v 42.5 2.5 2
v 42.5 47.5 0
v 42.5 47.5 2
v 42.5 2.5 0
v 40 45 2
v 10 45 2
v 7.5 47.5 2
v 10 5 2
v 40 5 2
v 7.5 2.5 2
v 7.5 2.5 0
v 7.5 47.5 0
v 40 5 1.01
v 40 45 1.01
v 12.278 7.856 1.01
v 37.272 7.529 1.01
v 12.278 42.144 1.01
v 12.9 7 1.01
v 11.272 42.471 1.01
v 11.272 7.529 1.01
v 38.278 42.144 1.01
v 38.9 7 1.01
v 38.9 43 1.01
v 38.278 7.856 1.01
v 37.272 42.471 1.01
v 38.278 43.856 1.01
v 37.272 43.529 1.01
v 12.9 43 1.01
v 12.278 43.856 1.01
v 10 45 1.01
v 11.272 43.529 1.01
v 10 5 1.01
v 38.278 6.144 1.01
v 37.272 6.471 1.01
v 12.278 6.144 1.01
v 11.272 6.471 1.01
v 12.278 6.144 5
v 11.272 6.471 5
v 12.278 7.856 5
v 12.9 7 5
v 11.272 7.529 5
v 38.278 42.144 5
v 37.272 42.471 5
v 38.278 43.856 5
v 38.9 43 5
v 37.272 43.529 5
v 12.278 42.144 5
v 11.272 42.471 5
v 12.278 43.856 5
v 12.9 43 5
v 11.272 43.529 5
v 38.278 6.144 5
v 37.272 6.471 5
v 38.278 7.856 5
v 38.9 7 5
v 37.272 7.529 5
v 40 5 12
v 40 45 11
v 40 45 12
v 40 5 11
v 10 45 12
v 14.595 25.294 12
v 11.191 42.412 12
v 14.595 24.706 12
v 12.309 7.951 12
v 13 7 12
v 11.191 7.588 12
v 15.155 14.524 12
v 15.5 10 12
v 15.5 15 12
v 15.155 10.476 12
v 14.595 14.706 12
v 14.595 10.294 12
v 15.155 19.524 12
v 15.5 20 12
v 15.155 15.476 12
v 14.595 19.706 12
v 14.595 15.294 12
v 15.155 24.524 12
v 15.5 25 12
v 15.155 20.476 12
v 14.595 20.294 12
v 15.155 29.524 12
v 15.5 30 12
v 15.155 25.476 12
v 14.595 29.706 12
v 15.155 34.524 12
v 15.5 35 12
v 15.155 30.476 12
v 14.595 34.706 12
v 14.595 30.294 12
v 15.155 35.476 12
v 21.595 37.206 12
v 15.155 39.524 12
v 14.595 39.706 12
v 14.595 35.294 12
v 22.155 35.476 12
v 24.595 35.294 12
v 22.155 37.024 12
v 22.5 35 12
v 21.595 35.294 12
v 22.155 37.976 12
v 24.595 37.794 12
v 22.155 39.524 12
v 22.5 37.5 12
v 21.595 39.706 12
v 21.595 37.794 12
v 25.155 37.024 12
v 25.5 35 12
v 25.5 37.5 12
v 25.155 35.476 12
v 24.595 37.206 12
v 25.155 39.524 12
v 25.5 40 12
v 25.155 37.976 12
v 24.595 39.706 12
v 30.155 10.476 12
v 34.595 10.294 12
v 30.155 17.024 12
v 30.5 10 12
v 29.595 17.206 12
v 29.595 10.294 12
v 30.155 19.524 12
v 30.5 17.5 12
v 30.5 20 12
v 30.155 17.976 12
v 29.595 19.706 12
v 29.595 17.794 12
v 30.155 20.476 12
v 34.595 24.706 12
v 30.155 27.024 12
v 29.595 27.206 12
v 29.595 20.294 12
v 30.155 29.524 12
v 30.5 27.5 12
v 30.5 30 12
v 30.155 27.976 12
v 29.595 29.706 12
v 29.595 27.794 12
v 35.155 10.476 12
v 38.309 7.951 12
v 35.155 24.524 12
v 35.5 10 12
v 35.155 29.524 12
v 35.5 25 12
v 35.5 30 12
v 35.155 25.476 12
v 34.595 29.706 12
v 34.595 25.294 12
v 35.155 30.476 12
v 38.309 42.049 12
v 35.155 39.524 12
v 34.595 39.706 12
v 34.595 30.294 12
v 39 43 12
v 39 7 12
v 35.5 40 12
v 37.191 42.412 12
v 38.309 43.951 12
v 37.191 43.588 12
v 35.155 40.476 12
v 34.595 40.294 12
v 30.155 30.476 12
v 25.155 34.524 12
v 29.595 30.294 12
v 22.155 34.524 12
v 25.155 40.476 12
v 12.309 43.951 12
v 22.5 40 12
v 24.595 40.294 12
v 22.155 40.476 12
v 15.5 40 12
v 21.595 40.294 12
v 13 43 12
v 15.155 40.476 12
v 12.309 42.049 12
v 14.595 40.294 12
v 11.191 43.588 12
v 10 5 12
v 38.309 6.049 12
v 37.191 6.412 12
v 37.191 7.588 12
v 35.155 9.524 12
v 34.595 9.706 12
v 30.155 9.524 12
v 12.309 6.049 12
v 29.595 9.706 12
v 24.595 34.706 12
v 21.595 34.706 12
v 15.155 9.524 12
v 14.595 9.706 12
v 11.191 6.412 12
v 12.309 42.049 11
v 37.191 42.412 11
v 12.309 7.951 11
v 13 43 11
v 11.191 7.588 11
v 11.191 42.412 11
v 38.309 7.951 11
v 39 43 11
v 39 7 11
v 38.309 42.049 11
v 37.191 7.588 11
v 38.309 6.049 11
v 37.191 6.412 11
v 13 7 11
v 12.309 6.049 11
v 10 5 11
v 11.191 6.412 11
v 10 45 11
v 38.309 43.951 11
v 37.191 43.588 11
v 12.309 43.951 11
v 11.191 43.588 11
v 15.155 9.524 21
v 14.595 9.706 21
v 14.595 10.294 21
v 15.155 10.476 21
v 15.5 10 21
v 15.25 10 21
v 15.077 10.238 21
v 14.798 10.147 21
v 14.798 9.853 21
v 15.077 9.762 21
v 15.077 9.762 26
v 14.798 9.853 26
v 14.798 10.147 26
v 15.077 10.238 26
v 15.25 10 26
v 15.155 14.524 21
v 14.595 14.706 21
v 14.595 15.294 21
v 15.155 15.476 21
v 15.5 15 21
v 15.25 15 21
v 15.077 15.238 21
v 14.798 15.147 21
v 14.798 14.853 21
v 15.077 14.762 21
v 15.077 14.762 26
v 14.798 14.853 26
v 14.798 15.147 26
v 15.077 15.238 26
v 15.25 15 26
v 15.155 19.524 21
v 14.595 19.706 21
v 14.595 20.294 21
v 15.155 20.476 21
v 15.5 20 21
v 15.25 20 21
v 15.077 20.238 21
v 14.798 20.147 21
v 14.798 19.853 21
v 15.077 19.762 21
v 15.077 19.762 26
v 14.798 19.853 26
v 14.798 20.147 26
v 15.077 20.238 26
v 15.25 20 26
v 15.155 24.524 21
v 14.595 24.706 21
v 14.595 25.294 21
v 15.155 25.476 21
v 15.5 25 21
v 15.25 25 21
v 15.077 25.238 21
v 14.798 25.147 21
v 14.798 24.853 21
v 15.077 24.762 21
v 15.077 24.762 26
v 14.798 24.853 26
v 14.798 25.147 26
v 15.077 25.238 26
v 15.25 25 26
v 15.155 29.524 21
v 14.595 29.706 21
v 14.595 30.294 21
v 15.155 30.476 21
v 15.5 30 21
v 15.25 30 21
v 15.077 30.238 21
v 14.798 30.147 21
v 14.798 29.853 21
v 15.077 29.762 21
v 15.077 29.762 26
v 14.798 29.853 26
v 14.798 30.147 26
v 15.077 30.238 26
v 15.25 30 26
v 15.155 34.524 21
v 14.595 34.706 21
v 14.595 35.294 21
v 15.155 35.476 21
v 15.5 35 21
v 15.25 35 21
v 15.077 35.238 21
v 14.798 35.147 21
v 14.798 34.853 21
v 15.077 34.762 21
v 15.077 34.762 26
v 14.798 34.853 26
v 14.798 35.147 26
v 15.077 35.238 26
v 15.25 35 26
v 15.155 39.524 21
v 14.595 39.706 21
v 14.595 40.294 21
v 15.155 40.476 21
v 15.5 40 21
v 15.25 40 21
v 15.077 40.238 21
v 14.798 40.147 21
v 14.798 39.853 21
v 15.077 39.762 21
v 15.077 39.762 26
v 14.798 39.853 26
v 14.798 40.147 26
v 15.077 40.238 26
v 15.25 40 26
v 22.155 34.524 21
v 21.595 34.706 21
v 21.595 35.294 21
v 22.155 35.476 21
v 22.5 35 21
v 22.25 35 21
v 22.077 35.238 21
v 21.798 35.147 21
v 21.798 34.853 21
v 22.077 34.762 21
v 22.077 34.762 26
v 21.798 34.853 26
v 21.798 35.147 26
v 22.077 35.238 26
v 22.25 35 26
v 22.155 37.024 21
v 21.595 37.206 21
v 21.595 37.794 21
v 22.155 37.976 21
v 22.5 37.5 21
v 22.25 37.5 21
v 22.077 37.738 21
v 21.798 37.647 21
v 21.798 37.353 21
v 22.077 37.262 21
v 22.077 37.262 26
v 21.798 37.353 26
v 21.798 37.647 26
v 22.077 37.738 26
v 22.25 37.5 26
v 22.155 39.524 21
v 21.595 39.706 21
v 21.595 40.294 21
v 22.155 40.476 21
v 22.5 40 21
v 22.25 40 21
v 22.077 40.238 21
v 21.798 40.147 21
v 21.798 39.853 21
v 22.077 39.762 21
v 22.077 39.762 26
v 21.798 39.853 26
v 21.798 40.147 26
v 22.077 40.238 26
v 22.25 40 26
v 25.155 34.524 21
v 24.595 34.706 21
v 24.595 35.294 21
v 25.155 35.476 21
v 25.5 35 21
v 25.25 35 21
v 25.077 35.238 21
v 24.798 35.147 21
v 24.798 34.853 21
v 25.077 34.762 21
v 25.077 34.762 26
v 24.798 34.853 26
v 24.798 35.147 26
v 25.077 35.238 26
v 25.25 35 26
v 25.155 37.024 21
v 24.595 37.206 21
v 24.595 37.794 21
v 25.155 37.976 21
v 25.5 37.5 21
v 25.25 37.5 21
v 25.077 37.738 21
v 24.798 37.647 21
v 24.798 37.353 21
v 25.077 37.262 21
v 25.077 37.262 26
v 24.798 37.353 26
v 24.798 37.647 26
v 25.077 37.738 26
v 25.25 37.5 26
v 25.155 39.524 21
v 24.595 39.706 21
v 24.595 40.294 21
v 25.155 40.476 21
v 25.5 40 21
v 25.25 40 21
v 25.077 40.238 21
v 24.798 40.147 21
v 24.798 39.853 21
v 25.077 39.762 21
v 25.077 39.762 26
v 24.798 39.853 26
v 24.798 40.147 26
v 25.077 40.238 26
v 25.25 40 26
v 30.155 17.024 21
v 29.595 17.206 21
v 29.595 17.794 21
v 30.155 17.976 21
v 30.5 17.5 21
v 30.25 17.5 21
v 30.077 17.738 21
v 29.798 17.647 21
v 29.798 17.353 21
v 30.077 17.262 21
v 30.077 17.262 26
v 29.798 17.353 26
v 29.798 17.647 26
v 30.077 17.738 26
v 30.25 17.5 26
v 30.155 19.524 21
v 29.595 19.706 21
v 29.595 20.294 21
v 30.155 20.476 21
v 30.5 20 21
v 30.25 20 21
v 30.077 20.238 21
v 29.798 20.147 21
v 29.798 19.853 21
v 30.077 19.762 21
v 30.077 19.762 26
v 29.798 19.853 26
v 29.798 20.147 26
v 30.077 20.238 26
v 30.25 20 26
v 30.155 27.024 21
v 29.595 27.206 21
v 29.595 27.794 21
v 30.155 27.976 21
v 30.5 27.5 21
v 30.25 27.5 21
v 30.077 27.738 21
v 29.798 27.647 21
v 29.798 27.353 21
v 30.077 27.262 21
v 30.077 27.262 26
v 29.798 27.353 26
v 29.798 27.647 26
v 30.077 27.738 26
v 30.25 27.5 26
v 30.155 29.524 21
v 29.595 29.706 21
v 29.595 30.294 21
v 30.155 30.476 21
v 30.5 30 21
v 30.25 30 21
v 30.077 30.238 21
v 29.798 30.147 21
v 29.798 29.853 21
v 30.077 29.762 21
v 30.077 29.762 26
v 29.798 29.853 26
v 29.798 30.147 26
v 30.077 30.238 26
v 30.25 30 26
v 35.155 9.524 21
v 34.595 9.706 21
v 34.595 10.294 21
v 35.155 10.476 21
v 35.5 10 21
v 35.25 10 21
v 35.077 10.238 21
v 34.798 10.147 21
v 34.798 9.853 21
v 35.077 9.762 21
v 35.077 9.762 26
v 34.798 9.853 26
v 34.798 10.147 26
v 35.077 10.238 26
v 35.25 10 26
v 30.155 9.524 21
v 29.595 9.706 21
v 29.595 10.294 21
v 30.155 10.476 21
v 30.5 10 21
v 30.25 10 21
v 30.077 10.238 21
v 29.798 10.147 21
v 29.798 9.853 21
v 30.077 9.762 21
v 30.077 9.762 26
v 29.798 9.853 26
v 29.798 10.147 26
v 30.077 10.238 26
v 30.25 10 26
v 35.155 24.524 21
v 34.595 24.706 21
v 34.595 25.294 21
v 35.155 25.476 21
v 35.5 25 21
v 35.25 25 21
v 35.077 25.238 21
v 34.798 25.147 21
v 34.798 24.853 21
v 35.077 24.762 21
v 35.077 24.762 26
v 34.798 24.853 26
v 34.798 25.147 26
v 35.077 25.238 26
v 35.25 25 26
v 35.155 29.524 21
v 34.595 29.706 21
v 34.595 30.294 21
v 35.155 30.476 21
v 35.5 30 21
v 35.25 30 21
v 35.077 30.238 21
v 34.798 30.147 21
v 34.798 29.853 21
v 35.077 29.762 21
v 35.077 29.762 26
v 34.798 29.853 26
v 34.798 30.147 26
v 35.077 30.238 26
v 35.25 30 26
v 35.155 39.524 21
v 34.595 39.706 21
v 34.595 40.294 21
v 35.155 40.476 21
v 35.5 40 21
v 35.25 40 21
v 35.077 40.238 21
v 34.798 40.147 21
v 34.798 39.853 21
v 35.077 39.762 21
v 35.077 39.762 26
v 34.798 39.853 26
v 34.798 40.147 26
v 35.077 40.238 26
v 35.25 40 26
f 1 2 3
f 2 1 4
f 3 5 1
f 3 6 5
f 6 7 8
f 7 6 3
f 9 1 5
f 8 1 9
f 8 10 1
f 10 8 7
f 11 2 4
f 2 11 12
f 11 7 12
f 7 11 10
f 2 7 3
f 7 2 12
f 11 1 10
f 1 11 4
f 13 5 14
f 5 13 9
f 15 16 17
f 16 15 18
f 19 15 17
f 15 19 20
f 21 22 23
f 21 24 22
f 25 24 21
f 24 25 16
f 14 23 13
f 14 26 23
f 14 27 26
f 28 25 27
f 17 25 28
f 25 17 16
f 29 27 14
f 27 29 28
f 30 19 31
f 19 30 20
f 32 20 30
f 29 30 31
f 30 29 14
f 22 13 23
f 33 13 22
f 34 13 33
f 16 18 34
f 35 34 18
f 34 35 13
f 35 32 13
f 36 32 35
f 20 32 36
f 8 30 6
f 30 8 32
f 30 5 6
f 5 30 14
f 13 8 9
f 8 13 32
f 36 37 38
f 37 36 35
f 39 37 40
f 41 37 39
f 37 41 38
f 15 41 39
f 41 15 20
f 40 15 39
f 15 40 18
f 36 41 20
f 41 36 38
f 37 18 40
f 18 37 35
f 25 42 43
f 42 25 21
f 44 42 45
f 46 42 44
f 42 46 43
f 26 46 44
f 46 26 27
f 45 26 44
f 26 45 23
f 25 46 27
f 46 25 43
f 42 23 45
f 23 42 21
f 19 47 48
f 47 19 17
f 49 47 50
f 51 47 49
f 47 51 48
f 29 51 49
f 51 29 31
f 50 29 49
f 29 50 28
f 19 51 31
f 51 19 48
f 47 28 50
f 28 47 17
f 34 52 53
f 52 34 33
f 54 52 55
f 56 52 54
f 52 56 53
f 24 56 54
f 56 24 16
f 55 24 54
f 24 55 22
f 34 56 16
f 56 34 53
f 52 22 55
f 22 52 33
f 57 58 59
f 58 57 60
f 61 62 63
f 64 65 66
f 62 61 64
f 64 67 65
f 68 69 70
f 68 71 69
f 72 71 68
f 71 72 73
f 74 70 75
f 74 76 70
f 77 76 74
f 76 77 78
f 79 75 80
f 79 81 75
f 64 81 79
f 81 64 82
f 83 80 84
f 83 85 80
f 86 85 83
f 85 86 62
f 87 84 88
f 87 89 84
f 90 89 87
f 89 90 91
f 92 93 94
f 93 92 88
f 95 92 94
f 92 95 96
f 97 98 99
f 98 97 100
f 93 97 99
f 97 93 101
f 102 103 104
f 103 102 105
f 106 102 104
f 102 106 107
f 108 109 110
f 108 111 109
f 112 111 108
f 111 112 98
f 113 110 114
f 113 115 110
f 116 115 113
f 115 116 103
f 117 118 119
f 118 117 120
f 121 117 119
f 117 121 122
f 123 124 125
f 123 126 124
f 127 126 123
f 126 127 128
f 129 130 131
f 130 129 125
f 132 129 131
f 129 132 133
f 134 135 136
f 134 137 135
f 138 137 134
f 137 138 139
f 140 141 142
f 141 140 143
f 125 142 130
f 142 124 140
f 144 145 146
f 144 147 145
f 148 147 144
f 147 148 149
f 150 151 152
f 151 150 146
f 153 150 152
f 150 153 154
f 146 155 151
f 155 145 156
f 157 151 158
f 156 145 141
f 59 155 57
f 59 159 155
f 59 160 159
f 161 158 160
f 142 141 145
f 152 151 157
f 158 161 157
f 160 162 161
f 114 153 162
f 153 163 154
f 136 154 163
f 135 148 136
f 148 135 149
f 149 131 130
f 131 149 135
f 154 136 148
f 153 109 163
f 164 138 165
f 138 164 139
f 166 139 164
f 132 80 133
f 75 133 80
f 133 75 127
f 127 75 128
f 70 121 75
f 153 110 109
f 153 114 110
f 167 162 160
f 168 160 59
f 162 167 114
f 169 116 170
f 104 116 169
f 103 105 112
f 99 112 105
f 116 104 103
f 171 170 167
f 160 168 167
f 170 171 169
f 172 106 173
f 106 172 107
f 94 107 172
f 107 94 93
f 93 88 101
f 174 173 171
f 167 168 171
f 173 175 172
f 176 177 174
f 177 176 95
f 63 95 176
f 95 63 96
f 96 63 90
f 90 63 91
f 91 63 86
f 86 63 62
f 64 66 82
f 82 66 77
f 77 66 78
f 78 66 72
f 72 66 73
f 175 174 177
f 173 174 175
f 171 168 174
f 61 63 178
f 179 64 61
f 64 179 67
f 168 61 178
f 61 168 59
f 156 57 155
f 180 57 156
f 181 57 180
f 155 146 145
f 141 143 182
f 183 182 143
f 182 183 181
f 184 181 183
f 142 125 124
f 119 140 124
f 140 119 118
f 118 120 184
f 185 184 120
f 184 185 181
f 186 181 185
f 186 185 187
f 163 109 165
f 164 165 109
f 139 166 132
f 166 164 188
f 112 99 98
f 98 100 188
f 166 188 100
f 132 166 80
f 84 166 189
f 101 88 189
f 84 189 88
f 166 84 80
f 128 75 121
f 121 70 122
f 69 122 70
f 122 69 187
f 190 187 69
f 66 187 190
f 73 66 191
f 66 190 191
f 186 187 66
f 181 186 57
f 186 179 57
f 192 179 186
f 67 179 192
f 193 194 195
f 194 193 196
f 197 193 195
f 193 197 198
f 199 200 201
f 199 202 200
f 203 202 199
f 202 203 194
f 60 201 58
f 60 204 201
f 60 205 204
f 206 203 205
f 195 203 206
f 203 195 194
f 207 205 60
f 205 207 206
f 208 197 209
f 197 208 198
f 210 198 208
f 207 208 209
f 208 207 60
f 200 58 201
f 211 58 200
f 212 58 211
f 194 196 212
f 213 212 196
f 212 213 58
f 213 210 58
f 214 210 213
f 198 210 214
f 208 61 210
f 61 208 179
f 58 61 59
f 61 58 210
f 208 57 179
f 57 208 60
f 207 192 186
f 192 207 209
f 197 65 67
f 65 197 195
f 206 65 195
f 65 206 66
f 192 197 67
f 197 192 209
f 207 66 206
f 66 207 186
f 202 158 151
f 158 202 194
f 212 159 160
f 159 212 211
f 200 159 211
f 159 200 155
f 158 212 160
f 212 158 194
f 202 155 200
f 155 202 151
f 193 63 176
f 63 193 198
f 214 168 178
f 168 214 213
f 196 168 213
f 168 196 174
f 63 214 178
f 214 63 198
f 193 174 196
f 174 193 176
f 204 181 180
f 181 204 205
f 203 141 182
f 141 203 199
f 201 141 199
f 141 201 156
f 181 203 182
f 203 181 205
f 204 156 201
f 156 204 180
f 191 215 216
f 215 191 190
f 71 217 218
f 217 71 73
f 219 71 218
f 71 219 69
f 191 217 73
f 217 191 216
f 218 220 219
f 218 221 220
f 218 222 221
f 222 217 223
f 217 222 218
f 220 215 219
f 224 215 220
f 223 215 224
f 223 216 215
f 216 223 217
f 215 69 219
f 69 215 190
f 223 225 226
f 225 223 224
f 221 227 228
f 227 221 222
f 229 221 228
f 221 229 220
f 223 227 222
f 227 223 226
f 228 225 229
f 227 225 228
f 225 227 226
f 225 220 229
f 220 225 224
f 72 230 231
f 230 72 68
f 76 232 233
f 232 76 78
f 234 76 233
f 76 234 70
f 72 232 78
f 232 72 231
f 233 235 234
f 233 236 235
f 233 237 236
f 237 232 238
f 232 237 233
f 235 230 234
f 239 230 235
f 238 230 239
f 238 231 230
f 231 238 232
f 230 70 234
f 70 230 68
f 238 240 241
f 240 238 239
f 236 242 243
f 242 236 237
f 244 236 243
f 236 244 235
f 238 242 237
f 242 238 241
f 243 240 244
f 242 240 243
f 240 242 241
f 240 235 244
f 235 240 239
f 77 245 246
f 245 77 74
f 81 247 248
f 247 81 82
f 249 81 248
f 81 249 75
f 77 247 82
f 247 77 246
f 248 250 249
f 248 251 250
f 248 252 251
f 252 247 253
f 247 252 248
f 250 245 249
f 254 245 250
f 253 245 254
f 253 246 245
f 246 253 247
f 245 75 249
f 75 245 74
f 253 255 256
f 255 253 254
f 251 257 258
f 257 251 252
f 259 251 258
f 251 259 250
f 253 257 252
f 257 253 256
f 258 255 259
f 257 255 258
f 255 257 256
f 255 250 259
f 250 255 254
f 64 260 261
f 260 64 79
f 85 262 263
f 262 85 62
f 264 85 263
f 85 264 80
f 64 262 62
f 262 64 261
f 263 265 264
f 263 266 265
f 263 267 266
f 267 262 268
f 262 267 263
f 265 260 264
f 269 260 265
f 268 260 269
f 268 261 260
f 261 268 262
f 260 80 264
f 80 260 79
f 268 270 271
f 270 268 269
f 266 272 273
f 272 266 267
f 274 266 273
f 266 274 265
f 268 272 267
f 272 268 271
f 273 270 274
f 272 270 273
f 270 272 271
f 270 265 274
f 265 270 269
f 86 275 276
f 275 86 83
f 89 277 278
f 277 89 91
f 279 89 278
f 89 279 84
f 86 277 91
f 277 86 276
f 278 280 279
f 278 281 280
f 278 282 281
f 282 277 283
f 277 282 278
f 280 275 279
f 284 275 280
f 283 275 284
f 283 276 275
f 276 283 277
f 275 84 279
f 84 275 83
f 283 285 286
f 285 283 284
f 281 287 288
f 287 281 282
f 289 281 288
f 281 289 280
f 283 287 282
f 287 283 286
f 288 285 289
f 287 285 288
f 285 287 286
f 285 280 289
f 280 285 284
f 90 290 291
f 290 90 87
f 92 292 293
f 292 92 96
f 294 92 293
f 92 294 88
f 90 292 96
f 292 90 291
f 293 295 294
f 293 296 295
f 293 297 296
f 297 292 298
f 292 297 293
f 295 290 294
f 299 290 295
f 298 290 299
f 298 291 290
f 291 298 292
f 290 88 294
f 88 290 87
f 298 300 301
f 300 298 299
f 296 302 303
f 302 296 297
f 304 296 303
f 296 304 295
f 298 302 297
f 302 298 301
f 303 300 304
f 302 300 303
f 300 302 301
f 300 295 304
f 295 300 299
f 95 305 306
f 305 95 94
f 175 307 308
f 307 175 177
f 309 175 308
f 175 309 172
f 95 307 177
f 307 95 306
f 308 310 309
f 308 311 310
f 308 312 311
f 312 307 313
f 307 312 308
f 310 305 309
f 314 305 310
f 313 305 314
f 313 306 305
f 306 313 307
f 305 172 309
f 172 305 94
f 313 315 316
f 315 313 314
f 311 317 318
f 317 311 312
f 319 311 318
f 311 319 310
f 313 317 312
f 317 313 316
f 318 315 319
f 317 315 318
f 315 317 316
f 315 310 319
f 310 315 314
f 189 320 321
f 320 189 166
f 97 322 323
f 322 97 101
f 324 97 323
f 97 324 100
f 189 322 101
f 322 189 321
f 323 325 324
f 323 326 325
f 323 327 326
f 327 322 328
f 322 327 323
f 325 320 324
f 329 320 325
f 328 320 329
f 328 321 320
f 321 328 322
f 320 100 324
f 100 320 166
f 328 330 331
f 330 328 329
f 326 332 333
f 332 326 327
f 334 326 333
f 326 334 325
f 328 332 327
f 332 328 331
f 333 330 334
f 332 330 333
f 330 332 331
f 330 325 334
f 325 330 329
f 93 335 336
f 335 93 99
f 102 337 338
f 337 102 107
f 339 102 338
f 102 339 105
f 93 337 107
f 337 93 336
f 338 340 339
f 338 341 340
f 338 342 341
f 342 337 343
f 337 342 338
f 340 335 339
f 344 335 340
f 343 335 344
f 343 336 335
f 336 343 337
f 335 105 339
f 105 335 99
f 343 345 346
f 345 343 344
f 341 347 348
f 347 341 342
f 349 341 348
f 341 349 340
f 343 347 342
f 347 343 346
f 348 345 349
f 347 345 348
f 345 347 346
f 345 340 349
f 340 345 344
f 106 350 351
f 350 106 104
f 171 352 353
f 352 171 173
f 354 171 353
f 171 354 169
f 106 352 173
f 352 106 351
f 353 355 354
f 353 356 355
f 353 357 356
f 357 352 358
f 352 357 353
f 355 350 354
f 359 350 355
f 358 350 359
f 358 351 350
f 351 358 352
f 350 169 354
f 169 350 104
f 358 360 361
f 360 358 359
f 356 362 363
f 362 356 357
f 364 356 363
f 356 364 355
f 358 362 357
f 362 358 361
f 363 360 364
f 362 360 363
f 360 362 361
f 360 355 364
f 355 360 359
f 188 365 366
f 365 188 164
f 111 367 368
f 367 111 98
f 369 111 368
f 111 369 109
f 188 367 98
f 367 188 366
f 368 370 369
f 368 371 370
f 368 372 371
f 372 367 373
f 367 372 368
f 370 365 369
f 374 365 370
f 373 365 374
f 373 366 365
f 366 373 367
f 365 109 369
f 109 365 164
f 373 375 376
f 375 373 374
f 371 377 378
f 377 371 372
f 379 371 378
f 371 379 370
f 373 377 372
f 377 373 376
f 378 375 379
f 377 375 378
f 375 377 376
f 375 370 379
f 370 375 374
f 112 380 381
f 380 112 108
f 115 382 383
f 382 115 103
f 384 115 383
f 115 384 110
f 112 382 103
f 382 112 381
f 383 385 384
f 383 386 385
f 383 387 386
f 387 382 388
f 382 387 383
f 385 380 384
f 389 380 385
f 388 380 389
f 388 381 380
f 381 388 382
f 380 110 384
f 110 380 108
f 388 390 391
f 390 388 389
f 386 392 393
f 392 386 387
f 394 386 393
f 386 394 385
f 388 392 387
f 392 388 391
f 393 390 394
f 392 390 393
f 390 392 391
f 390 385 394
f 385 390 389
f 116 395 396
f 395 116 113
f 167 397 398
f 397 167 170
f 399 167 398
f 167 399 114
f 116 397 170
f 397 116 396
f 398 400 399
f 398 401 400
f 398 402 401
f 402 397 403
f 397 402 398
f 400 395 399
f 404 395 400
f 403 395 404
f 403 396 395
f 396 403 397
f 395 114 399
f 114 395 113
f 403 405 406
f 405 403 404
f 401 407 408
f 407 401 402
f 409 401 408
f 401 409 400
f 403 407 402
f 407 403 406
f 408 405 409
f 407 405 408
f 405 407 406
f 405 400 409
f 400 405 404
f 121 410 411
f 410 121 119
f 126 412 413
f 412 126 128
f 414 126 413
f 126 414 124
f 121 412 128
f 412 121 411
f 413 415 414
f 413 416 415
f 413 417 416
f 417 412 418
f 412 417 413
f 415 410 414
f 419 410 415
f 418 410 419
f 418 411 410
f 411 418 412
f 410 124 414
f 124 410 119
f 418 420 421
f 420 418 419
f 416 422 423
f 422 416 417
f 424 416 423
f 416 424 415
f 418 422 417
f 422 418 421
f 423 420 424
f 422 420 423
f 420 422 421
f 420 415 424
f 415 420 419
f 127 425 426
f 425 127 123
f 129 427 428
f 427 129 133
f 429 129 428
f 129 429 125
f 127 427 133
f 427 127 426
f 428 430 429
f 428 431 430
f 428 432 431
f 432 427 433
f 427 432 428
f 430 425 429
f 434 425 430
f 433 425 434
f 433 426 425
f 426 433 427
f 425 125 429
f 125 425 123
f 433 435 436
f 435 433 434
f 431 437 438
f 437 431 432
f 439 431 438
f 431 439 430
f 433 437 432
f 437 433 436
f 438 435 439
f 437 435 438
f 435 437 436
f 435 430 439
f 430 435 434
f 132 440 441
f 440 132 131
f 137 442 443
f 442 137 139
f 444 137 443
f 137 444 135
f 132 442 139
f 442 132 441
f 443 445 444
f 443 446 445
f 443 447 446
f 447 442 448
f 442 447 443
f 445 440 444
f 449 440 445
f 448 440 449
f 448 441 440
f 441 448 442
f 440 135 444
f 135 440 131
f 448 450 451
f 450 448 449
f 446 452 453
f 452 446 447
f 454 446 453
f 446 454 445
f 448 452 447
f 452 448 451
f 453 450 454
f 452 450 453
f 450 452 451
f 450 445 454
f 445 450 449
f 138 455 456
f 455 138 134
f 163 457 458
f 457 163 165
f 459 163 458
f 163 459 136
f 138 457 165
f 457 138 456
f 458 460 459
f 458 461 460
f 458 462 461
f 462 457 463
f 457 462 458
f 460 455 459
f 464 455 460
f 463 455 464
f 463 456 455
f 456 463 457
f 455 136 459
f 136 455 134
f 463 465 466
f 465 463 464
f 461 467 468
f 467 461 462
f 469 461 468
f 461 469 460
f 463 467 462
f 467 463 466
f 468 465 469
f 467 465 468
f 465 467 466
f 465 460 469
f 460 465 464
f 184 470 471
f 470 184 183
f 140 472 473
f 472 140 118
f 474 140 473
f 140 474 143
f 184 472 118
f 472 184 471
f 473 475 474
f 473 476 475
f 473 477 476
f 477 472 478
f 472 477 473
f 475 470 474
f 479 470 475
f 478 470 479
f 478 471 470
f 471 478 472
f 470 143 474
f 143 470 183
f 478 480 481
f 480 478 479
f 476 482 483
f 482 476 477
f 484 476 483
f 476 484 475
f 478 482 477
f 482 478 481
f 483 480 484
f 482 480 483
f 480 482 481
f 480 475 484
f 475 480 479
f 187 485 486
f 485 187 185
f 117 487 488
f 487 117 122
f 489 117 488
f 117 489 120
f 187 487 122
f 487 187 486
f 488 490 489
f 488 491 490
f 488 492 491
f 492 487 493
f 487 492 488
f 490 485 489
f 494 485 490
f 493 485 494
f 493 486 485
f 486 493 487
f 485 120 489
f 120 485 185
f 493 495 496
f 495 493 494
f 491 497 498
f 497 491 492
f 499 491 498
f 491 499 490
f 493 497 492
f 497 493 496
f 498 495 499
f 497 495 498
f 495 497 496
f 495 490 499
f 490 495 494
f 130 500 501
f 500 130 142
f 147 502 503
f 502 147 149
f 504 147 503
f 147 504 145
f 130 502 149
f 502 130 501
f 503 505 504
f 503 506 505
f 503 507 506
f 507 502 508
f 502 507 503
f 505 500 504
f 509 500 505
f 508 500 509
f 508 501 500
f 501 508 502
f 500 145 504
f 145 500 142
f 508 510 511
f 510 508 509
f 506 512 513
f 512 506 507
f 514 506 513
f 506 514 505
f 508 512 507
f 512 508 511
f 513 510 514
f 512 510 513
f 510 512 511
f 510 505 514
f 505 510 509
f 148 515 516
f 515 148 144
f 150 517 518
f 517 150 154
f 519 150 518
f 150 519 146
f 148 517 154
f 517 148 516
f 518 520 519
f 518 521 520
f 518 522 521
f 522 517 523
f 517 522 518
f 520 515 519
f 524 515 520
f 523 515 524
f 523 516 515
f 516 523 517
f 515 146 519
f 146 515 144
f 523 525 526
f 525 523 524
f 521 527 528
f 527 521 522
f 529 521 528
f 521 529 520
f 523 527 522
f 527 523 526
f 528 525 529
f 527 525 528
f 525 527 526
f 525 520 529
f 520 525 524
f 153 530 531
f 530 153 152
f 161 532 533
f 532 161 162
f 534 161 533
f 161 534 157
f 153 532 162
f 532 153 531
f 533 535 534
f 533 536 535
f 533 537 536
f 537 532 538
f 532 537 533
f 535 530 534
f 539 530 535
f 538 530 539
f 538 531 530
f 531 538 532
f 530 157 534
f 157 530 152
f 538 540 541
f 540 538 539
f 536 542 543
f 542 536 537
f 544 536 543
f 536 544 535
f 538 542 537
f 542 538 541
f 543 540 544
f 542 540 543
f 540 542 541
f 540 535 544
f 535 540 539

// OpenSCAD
// file: lego.scad
/*
 * Modified lego code originally copied from canadaduane:
 * https://github.com/canadaduane/Things/blob/master/Lego/lego.scad
 */
 
// Exterior thickness
lego_thickness=2;
wall_thickness=lego_thickness / 5;

// Knobs are the circles on top of blocks
knob_diameter=lego_thickness - (wall_thickness * 2);
knob_height=lego_thickness * 2  / 3;
knob_spacing=knob_diameter * 3/2;


// The 'positive space' of a lego block
module lego_positive(length) {
  num = ((length - (wall_thickness * 2)) / knob_spacing );
  union()
  {
    cube([length, lego_thickness, lego_thickness]);
    translate([knob_diameter / 2 + wall_thickness,
               knob_diameter / 2 + wall_thickness, 0])
      for (xcount=[0:num-1])
        {
          translate([xcount * knob_spacing, 0, lego_thickness])
            cylinder(r=knob_diameter / 2, h=knob_height);
        }
  }
}
 
// The 'negative space' of a lego block
module lego_negative(length) {
  num = ((length - (wall_thickness * 2)) / knob_spacing ) + 1;
  difference()
    {
      translate([wall_thickness, wall_thickness, -0.1])
        cube([length - wall_thickness * 2,
              lego_thickness - wall_thickness * 2,
              knob_height]);
      for (xcount=[1:num-1])
        translate([xcount * knob_spacing, lego_thickness / 2, -0.1])
          cylinder(r=knob_diameter/4,h=knob_height);
    }
}
// file: bottom.scad
use <rambo.scad>
use <lego.scad>

module bottom_holder() {
  color("Blue") union() {
    difference() {
      /* Holder */
      cube([35, 45, 2]);
      /* Hole for the rambo board */
      translate ([2.5, 2.5, 1.01]) cube([30, 40, 1]);
    }
    /* 4 pins to hold the board from its screw holes */
    translate([4.5, 4.5, 0]) cylinder (r=0.9, h=5);
    translate([30.5, 40.5, 0]) cylinder (r=0.9, h=5);
    translate([4.5, 40.5, 0]) cylinder (r=0.9, h=5);
    translate([30.5, 4.5, 0]) cylinder (r=0.9, h=5);
  }
}

module bottom_cap() {
  color("Aqua") union() {
    difference () {
      /* Cap */
      cube([50, 50, 5]);
      /* Hole for the holder to fit in */
      translate([10, 5, -1]) cube([30, 40, 10]);
    }
    /* Connectors for the 4 screw holes */
    difference() {
      /* block that holds the board */
      translate([10, 5, 2.5]) cylinder(r=4, h=3);
      /* screw hole */
      translate([12, 7, 0]) cylinder (r=1, h=5);
    }
    difference() {
      translate([10, 45, 2.5]) cylinder(r=4, h=3);
      translate([12, 43, 0]) cylinder (r=1, h=5);
    }
    difference() {
      translate([40, 5, 2.5]) cylinder(r=4, h=3);
      translate([38, 7, 0]) cylinder (r=1, h=5);
    }
    difference() {
      translate([40, 45, 2.5]) cylinder(r=4, h=3);
      translate([38, 43, 0]) cylinder (r=1, h=5);
    }
    /* 4 pins to hold the DUT rambo from screw holes */
    translate([12, 7, 5]) cylinder (r=0.9, h=25);
    translate([12, 43, 5]) cylinder (r=0.9, h=25);
    translate([38, 7, 5]) cylinder (r=0.9, h=25);
    translate([38, 43, 5]) cylinder (r=0.9, h=25);
    /* 4 washers to hold the DUT rambo on top of the pogo pins */
    translate([12, 7, 12.5]) cylinder (r=2, h=1);
    translate([12, 43, 12.5]) cylinder (r=2, h=1);
    translate([38, 7, 12.5]) cylinder (r=2, h=1);
    translate([38, 43, 12.5]) cylinder (r=2, h=1i);
  }
}

translate([7.5, 2.5, 0]) bottom_holder();
bottom_cap();
// file: rambo.scad
module pogo_pin () {
  color("Yellow") union() {
    cylinder (r=0.5, h=10);
    translate ([0, 0, 10]) cylinder (r=0.25, h=5);
  }
}

module rambo_board() {
  color("Green") difference() {
    cube([30, 40, 1]);
    translate([2, 2, -1]) cylinder (r=1, h=5);
    translate([28, 38, -1]) cylinder (r=1, h=5);
    translate([2, 38, -1]) cylinder (r=1, h=5);
    translate([28, 2, -1]) cylinder (r=1, h=5);
  }
}

module rambo_connector() {
  color("Gray") cube([3, 5, 5]);
}

module rambo_connectors() {
  /* motors */
  translate([2, 2, 0]) rambo_connector();
  translate([2, 10, 0]) rambo_connector();
  translate([2, 18, 0]) rambo_connector();
  translate([2, 26, 0]) rambo_connector();
  translate([2, 34, 0]) rambo_connector();
  /* endstops */
  translate([10, 29, 0]) rambo_connector();
  translate([10, 35, 0]) rambo_connector();
  translate([14, 29, 0]) rambo_connector();
  translate([14, 35, 0]) rambo_connector();
  /* Thermistors */
  translate([12, 10, 0]) rambo_connector();
  translate([15, 10, 0]) rambo_connector();
  /* USB */
  translate([20, 37, 0]) rambo_connector();
  /* Mosfets */
  translate([25, 20, 0]) rambo_connector();
  translate([25, 25, 0]) rambo_connector();
  translate([25, 30, 0]) rambo_connector();
  translate([25, 33, 0]) rambo_connector();
  /* Power */
  translate([25, 2, 0]) rotate([0, 0, 90]) rambo_connector();
  translate([30, 2, 0]) rotate([0, 0, 90]) rambo_connector();
}

module rambo_pins() {
  /* motors */
  translate([5, 5, 0]) pogo_pin();
  translate([5, 10, 0]) pogo_pin();
  translate([5, 15, 0]) pogo_pin();
  translate([5, 20, 0]) pogo_pin();
  translate([5, 25, 0]) pogo_pin();
  translate([5, 30, 0]) pogo_pin();
  translate([5, 35, 0]) pogo_pin();
  /* endstops */
  translate([12, 30, 0]) pogo_pin();
  translate([12, 32.5, 0]) pogo_pin();
  translate([12, 35, 0]) pogo_pin();
  translate([15, 30, 0]) pogo_pin();
  translate([15, 32.5, 0]) pogo_pin();
  translate([15, 35, 0]) pogo_pin();
  /* ISP */
  translate([20, 12.5, 0]) pogo_pin();
  translate([20, 15, 0]) pogo_pin();
  translate([20, 22.5, 0]) pogo_pin();
  translate([20, 25, 0]) pogo_pin();
  /* Power */
  translate([25, 5, 0]) pogo_pin();
  translate([20, 5, 0]) pogo_pin();
  /* Mosfets */
  translate([25, 20, 0]) pogo_pin();
  translate([25, 25, 0]) pogo_pin();
  translate([25, 35, 0]) pogo_pin();
}

module rambo(connectors=1, holes=0, pins=0) {
  if (connectors) {
    union() {
      rambo_board();
      rambo_connectors();
    }
  } else if (holes) {
    difference() {
      rambo_board();
      translate([0, 0, -1]) rambo_pins();
    }
  } else if (pins) {
    union() {
      rambo_board();
      rambo_pins();
    }
  } else {
    rambo_board();
  }
}

rambo(1, 0, 0);
// main file
use <rambo.scad>
use <bottom.scad>

module bottom() {
  translate([7.5, 2.5, 0]) bottom_holder();
  if ($t < 0.5) {
    assign (animation = ($t/0.5)) 
      translate ([10, 5, 11 - (animation * 10)] ) rambo(0, 0, 1);
  } else if ($t < 1.0) {
    translate ([10, 5, 1] ) rambo(0, 0, 1);
    assign (animation = (($t-0.5)/0.5))
      translate ([0, 0, 15 - (animation * 15)] ) bottom_cap();
  } else {
    translate ([10, 5, 1] ) rambo(0, 0, 1);
    bottom_cap();
  }
}

bottom();
